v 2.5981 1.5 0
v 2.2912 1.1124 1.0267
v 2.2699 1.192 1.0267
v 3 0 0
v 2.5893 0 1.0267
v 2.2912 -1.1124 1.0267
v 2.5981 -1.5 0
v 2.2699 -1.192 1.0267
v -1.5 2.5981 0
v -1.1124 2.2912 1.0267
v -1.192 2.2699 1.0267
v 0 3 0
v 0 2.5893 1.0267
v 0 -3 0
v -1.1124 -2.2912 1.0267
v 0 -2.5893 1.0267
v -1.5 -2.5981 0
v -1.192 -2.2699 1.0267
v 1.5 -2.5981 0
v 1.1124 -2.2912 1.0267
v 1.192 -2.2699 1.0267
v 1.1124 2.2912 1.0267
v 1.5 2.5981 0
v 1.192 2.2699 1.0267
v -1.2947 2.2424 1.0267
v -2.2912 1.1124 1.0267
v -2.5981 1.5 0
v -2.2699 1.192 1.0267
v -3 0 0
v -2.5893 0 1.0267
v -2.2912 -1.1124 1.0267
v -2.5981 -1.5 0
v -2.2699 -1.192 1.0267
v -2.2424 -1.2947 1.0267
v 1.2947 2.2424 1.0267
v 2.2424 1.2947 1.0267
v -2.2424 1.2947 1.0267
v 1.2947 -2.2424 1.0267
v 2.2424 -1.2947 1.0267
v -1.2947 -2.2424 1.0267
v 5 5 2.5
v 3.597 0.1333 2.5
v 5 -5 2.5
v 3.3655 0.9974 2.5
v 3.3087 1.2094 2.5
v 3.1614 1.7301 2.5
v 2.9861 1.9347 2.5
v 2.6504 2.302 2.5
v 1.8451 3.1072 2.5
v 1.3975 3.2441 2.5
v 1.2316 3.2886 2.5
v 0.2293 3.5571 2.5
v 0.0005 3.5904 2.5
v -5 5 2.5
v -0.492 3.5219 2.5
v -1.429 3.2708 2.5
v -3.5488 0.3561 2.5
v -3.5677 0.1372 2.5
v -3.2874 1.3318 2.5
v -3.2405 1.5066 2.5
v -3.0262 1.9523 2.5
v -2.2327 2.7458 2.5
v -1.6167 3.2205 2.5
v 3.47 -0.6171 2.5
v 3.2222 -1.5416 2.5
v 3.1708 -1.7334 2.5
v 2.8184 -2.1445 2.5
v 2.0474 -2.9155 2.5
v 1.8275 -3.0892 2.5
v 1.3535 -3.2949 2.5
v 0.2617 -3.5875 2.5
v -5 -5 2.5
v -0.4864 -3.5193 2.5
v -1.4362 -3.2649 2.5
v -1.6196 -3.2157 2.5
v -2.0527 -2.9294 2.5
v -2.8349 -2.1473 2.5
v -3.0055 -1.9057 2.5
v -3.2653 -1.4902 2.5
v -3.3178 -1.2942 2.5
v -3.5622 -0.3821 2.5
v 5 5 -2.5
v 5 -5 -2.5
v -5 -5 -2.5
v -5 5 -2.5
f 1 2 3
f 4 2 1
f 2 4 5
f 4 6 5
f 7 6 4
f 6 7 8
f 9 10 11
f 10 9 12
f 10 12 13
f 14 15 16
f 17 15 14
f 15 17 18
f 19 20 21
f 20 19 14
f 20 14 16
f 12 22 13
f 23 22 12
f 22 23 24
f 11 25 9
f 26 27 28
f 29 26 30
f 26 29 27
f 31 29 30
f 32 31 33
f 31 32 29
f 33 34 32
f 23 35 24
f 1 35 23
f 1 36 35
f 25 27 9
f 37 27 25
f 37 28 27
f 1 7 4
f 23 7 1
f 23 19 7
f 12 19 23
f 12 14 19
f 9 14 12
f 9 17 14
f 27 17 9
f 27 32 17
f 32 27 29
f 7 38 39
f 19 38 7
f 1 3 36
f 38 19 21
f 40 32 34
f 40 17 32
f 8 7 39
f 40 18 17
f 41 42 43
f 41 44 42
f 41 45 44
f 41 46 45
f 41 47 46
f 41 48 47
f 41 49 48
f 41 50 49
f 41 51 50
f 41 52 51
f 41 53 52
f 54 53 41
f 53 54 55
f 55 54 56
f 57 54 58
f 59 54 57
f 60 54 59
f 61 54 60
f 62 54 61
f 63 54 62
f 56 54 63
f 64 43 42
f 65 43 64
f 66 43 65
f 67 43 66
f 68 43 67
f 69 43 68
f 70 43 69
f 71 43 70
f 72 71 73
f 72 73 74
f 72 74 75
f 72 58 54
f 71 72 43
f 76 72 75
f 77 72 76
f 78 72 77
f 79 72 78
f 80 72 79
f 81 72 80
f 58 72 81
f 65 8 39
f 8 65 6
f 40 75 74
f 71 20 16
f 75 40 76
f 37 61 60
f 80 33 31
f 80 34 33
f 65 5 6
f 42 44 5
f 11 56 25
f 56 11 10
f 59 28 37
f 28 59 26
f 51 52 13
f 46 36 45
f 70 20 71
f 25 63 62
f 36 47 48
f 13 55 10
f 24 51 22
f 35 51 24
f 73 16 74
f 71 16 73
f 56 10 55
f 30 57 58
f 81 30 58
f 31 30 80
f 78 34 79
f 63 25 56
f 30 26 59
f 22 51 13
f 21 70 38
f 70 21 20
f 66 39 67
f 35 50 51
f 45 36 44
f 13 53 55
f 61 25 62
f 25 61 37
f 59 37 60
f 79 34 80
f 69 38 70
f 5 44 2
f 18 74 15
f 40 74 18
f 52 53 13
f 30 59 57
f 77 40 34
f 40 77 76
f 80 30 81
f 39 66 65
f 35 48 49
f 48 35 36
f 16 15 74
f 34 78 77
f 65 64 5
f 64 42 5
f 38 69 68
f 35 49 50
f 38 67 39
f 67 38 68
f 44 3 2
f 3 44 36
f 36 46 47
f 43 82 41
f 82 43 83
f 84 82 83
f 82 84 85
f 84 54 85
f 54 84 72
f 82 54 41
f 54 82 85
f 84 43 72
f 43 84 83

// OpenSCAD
    ////////////////////////////////////////////////////////
    /*
    unionRound() Module by Torleif Ceder - TLC123 late summer 2021
     Pretty fast Union with radius, But limited to a subset of cases
    Usage 
     unionRound( radius , detail , epsilon )
        {
         YourObject();
         YourObject(); 
        } 
    limitations: 
     0. Only really fast when boolean operands are convex, 
            Minkowski is fast in that case. 
     1. Boolean operands may be concave but can only touch 
            in a single convex area
     2. Radius is of elliptic type and is only approximate r
            were operand intersect at perpendicular angle. 
    */
    //////////////////////////////////////////////////////// 

$fn=12;
differenceRound(1.5, 1) {   
        scale([10,10,5])cube(1,true);
        cylinder(5,3,1,$fn=12); 
}
 
 
// end of demo code

// limited to genus  0(ZERO) pockets
 module differenceRound(r, detail,firstcall=true) {
     // auto clip to intersection + clad
     if (firstcall){
         differenceRound(r, detail,firstcall=false)
         {    children(0);
              children(1);
              clad(r) hull()intersection() {
                    children(0);
                    children(1);
                }
         }
         }
     else{
         // now things are safe 
    difference() {
        children(0);
        unionRound(r, detail) {
           intersection(){ children(1); children(2);}            
           intersection(){ shell(r * 2) children(0);children(2);} 
            }
        }
    }
}
//                 module intersectionRound(r, detail )
//        {  
//            intersection(){children(0);children(1); }
//           ! intersection(){
//               
//             unionRound(r,detail){
//               children(1);
//               shell(r*2)children(0); 
//                } 
//                
//             unionRound(r,detail){
//               children(0);
//               shell(r*2)children(1); 
//                } 
//                } 
//            }
    module unionRound(r, detail = 5) {
        epsilon = 1e-6;
        children(0);
        children(1);
       step = 90 / detail;
      for (i = [0:   detail-1]) {
            {
                x = r - sin(i * step ) * r;
                y = r - cos(i * step ) * r;
                xi = r - sin((i * step + step)  ) * r;
                yi = r - cos((i * step + step)  ) * r;
                color(rands(0, 1, 3, i))
                hull() {
                    intersection() {
                        // shell(epsilon) 
                        clad(x) children(0);
                        // shell(epsilon) 
                        clad(y) children(1);
                    }
                    intersection() {
                        // shell(epsilon) 
                        clad(xi) children(0);
                        // shell(epsilon) 
                        clad(yi) children(1);
                    }
                }
            }
        }
    }
    // unionRound helper expand by r
    module clad(r) {
        minkowski() {
            children();
            //        icosphere(r,2);
            isosphere(r, 70);
        }
    }
    // unionRound helper
    module shell(r) {
        difference() {
            clad(r) children();
            children();
        }
    }
 /*   A New Computationally Efficient Method for Spacing n Points on 
a Sphere - Jonathan Kogan  */
function sphericalcoordinate(x,y)=  [cos(x  )*cos(y  ), sin(x  )*cos(y  ), sin(y  )];
function NX(n,x)= 
let(toDeg=57.2958,PI=acos(-1)/toDeg,
start=(-1.+1./(n-1.)),increment=(2.-2./(n-1.))/(n-1.) )
[ for (j= [0:n-1])let (s=start+j*increment )
 sphericalcoordinate(   s*x*toDeg,  PI/2.* sign(s)*(1.-sqrt(1.-abs(s)))*toDeg)];
function generatepoints(n)= NX(n,0.1+1.2*n);
module isosphere(r,detail){
a= generatepoints(detail);
scale(r)hull()polyhedron(a,[[for(i=[0:len(a)-1])i]]);
}
   
